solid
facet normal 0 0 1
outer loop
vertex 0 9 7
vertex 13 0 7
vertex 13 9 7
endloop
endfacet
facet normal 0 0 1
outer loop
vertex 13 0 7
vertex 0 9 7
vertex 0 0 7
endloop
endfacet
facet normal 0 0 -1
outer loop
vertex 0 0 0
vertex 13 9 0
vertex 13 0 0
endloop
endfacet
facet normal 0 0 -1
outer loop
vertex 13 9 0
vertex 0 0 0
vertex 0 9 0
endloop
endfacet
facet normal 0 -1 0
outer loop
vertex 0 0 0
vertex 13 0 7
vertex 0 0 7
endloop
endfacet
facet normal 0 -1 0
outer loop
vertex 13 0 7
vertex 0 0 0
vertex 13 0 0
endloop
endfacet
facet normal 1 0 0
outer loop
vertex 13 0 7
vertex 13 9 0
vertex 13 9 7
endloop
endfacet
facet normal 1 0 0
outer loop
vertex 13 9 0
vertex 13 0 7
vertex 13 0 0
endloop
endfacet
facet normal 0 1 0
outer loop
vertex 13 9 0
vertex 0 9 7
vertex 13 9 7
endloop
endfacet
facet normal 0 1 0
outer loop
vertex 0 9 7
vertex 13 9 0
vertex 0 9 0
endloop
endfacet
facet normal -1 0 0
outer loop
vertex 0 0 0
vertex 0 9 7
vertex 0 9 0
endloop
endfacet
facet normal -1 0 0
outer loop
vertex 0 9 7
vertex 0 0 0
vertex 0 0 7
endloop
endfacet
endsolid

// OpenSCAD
// Generated by SolidPython 1.0.1 on 2020-07-29 00:46:55


cube(size = [13, 9, 7]);
/***********************************************
*********      SolidPython code:      **********
************************************************
 
# import packages: SolidPython
from solid import *
from solid.utils import *
from itertools import chain, combinations, permutations


class Resize:

    def __init__(self, scad_file):
        self.scad_file = scad_file
        #self.scad_file = import_scad(scad_file)
        # cone/cylinder param:
        self.r1 = 0
        self.r2 = 0
        self.h = 0
        # rectangular prism param:
        self.w = 0
        self.l = 0
        # ellipse param:
        self.r = 0

    # import OpenScad code (file name corresponds to shape)


    # classify shape + parameters
    def assign(self, param1, param2, param3):
        if self.scad_file == 'cone.scad':
            self.r1 = param1
            self.r2 = param2
            self.h = param3
        elif self.scad_file == 'cylinder.scad':
            self.r1 = param1
            self.r2 = param2
            self.h = param3
        elif self.scad_file == 'rectangularPrism.scad':
            self.h = param1
            self.l = param2
            self.w = param3
        else:
            self.r = param1
            self.h = param2

    # resize parameters
    def iterate(self):
        x = range(3, 20, 2)
        i = 1
        if self.scad_file == 'cone.scad':
            tempList = list(permutations(x, 2))
            for temp in tempList:
                param1 = temp[0]
                param2 = temp[1]
                filepath = 'produced_scad_files/' + 'cone' + str(param1) + '_' + str(param2) + '_' + '.scad'
                scad_render_to_file(cylinder(h=param1, r1=param2, r2=0), filepath)

        elif self.scad_file == 'cylinder.scad':
            tempList = list(permutations(x, 3))
            for temp in tempList:
                param1 = temp[0]
                param2 = temp[1]
                filepath = 'produced_scad_files/' + 'cylinder' + str(param1) + '_' + str(param2) + '_' + '.scad'
                scad_render_to_file(cylinder(h=param1, r1=param2, r2=param2), filepath)

        elif self.scad_file == 'rectangularPrism.scad':
            tempList = list(permutations(x, 3))
            for temp in tempList:
                param1 = temp[0]
                param2 = temp[1]
                param3 = temp[2]
                filepath = 'produced_scad_files/' + 'rectangularPrism' + str(param1) + '_' + str(param2) + '_' + str(
                    param3) + '.scad'
                scad_render_to_file(cube(size=(param1, param2, param3)), filepath)

        elif self.scad_file == 'ellipse.scad':
            tempList = list(permutations(x, 4))
            for temp in tempList:
                param1 = temp[0]
                param2 = temp[1]
                param3 = temp[2]
                param4 = temp[3]
                filepath = 'produced_scad_files/' + 'ellipse' + str(param1) + '_' + str(param2) + '_' + str(param3) + '_' + str(param4) + '.scad'
                scad_render_to_file(scale([param1, param2, param3])(sphere(r=param4)), filepath)

    def render_to_scadfile(self):
        scad_render_to_file(scad, 'example.scad') 
 
************************************************/
